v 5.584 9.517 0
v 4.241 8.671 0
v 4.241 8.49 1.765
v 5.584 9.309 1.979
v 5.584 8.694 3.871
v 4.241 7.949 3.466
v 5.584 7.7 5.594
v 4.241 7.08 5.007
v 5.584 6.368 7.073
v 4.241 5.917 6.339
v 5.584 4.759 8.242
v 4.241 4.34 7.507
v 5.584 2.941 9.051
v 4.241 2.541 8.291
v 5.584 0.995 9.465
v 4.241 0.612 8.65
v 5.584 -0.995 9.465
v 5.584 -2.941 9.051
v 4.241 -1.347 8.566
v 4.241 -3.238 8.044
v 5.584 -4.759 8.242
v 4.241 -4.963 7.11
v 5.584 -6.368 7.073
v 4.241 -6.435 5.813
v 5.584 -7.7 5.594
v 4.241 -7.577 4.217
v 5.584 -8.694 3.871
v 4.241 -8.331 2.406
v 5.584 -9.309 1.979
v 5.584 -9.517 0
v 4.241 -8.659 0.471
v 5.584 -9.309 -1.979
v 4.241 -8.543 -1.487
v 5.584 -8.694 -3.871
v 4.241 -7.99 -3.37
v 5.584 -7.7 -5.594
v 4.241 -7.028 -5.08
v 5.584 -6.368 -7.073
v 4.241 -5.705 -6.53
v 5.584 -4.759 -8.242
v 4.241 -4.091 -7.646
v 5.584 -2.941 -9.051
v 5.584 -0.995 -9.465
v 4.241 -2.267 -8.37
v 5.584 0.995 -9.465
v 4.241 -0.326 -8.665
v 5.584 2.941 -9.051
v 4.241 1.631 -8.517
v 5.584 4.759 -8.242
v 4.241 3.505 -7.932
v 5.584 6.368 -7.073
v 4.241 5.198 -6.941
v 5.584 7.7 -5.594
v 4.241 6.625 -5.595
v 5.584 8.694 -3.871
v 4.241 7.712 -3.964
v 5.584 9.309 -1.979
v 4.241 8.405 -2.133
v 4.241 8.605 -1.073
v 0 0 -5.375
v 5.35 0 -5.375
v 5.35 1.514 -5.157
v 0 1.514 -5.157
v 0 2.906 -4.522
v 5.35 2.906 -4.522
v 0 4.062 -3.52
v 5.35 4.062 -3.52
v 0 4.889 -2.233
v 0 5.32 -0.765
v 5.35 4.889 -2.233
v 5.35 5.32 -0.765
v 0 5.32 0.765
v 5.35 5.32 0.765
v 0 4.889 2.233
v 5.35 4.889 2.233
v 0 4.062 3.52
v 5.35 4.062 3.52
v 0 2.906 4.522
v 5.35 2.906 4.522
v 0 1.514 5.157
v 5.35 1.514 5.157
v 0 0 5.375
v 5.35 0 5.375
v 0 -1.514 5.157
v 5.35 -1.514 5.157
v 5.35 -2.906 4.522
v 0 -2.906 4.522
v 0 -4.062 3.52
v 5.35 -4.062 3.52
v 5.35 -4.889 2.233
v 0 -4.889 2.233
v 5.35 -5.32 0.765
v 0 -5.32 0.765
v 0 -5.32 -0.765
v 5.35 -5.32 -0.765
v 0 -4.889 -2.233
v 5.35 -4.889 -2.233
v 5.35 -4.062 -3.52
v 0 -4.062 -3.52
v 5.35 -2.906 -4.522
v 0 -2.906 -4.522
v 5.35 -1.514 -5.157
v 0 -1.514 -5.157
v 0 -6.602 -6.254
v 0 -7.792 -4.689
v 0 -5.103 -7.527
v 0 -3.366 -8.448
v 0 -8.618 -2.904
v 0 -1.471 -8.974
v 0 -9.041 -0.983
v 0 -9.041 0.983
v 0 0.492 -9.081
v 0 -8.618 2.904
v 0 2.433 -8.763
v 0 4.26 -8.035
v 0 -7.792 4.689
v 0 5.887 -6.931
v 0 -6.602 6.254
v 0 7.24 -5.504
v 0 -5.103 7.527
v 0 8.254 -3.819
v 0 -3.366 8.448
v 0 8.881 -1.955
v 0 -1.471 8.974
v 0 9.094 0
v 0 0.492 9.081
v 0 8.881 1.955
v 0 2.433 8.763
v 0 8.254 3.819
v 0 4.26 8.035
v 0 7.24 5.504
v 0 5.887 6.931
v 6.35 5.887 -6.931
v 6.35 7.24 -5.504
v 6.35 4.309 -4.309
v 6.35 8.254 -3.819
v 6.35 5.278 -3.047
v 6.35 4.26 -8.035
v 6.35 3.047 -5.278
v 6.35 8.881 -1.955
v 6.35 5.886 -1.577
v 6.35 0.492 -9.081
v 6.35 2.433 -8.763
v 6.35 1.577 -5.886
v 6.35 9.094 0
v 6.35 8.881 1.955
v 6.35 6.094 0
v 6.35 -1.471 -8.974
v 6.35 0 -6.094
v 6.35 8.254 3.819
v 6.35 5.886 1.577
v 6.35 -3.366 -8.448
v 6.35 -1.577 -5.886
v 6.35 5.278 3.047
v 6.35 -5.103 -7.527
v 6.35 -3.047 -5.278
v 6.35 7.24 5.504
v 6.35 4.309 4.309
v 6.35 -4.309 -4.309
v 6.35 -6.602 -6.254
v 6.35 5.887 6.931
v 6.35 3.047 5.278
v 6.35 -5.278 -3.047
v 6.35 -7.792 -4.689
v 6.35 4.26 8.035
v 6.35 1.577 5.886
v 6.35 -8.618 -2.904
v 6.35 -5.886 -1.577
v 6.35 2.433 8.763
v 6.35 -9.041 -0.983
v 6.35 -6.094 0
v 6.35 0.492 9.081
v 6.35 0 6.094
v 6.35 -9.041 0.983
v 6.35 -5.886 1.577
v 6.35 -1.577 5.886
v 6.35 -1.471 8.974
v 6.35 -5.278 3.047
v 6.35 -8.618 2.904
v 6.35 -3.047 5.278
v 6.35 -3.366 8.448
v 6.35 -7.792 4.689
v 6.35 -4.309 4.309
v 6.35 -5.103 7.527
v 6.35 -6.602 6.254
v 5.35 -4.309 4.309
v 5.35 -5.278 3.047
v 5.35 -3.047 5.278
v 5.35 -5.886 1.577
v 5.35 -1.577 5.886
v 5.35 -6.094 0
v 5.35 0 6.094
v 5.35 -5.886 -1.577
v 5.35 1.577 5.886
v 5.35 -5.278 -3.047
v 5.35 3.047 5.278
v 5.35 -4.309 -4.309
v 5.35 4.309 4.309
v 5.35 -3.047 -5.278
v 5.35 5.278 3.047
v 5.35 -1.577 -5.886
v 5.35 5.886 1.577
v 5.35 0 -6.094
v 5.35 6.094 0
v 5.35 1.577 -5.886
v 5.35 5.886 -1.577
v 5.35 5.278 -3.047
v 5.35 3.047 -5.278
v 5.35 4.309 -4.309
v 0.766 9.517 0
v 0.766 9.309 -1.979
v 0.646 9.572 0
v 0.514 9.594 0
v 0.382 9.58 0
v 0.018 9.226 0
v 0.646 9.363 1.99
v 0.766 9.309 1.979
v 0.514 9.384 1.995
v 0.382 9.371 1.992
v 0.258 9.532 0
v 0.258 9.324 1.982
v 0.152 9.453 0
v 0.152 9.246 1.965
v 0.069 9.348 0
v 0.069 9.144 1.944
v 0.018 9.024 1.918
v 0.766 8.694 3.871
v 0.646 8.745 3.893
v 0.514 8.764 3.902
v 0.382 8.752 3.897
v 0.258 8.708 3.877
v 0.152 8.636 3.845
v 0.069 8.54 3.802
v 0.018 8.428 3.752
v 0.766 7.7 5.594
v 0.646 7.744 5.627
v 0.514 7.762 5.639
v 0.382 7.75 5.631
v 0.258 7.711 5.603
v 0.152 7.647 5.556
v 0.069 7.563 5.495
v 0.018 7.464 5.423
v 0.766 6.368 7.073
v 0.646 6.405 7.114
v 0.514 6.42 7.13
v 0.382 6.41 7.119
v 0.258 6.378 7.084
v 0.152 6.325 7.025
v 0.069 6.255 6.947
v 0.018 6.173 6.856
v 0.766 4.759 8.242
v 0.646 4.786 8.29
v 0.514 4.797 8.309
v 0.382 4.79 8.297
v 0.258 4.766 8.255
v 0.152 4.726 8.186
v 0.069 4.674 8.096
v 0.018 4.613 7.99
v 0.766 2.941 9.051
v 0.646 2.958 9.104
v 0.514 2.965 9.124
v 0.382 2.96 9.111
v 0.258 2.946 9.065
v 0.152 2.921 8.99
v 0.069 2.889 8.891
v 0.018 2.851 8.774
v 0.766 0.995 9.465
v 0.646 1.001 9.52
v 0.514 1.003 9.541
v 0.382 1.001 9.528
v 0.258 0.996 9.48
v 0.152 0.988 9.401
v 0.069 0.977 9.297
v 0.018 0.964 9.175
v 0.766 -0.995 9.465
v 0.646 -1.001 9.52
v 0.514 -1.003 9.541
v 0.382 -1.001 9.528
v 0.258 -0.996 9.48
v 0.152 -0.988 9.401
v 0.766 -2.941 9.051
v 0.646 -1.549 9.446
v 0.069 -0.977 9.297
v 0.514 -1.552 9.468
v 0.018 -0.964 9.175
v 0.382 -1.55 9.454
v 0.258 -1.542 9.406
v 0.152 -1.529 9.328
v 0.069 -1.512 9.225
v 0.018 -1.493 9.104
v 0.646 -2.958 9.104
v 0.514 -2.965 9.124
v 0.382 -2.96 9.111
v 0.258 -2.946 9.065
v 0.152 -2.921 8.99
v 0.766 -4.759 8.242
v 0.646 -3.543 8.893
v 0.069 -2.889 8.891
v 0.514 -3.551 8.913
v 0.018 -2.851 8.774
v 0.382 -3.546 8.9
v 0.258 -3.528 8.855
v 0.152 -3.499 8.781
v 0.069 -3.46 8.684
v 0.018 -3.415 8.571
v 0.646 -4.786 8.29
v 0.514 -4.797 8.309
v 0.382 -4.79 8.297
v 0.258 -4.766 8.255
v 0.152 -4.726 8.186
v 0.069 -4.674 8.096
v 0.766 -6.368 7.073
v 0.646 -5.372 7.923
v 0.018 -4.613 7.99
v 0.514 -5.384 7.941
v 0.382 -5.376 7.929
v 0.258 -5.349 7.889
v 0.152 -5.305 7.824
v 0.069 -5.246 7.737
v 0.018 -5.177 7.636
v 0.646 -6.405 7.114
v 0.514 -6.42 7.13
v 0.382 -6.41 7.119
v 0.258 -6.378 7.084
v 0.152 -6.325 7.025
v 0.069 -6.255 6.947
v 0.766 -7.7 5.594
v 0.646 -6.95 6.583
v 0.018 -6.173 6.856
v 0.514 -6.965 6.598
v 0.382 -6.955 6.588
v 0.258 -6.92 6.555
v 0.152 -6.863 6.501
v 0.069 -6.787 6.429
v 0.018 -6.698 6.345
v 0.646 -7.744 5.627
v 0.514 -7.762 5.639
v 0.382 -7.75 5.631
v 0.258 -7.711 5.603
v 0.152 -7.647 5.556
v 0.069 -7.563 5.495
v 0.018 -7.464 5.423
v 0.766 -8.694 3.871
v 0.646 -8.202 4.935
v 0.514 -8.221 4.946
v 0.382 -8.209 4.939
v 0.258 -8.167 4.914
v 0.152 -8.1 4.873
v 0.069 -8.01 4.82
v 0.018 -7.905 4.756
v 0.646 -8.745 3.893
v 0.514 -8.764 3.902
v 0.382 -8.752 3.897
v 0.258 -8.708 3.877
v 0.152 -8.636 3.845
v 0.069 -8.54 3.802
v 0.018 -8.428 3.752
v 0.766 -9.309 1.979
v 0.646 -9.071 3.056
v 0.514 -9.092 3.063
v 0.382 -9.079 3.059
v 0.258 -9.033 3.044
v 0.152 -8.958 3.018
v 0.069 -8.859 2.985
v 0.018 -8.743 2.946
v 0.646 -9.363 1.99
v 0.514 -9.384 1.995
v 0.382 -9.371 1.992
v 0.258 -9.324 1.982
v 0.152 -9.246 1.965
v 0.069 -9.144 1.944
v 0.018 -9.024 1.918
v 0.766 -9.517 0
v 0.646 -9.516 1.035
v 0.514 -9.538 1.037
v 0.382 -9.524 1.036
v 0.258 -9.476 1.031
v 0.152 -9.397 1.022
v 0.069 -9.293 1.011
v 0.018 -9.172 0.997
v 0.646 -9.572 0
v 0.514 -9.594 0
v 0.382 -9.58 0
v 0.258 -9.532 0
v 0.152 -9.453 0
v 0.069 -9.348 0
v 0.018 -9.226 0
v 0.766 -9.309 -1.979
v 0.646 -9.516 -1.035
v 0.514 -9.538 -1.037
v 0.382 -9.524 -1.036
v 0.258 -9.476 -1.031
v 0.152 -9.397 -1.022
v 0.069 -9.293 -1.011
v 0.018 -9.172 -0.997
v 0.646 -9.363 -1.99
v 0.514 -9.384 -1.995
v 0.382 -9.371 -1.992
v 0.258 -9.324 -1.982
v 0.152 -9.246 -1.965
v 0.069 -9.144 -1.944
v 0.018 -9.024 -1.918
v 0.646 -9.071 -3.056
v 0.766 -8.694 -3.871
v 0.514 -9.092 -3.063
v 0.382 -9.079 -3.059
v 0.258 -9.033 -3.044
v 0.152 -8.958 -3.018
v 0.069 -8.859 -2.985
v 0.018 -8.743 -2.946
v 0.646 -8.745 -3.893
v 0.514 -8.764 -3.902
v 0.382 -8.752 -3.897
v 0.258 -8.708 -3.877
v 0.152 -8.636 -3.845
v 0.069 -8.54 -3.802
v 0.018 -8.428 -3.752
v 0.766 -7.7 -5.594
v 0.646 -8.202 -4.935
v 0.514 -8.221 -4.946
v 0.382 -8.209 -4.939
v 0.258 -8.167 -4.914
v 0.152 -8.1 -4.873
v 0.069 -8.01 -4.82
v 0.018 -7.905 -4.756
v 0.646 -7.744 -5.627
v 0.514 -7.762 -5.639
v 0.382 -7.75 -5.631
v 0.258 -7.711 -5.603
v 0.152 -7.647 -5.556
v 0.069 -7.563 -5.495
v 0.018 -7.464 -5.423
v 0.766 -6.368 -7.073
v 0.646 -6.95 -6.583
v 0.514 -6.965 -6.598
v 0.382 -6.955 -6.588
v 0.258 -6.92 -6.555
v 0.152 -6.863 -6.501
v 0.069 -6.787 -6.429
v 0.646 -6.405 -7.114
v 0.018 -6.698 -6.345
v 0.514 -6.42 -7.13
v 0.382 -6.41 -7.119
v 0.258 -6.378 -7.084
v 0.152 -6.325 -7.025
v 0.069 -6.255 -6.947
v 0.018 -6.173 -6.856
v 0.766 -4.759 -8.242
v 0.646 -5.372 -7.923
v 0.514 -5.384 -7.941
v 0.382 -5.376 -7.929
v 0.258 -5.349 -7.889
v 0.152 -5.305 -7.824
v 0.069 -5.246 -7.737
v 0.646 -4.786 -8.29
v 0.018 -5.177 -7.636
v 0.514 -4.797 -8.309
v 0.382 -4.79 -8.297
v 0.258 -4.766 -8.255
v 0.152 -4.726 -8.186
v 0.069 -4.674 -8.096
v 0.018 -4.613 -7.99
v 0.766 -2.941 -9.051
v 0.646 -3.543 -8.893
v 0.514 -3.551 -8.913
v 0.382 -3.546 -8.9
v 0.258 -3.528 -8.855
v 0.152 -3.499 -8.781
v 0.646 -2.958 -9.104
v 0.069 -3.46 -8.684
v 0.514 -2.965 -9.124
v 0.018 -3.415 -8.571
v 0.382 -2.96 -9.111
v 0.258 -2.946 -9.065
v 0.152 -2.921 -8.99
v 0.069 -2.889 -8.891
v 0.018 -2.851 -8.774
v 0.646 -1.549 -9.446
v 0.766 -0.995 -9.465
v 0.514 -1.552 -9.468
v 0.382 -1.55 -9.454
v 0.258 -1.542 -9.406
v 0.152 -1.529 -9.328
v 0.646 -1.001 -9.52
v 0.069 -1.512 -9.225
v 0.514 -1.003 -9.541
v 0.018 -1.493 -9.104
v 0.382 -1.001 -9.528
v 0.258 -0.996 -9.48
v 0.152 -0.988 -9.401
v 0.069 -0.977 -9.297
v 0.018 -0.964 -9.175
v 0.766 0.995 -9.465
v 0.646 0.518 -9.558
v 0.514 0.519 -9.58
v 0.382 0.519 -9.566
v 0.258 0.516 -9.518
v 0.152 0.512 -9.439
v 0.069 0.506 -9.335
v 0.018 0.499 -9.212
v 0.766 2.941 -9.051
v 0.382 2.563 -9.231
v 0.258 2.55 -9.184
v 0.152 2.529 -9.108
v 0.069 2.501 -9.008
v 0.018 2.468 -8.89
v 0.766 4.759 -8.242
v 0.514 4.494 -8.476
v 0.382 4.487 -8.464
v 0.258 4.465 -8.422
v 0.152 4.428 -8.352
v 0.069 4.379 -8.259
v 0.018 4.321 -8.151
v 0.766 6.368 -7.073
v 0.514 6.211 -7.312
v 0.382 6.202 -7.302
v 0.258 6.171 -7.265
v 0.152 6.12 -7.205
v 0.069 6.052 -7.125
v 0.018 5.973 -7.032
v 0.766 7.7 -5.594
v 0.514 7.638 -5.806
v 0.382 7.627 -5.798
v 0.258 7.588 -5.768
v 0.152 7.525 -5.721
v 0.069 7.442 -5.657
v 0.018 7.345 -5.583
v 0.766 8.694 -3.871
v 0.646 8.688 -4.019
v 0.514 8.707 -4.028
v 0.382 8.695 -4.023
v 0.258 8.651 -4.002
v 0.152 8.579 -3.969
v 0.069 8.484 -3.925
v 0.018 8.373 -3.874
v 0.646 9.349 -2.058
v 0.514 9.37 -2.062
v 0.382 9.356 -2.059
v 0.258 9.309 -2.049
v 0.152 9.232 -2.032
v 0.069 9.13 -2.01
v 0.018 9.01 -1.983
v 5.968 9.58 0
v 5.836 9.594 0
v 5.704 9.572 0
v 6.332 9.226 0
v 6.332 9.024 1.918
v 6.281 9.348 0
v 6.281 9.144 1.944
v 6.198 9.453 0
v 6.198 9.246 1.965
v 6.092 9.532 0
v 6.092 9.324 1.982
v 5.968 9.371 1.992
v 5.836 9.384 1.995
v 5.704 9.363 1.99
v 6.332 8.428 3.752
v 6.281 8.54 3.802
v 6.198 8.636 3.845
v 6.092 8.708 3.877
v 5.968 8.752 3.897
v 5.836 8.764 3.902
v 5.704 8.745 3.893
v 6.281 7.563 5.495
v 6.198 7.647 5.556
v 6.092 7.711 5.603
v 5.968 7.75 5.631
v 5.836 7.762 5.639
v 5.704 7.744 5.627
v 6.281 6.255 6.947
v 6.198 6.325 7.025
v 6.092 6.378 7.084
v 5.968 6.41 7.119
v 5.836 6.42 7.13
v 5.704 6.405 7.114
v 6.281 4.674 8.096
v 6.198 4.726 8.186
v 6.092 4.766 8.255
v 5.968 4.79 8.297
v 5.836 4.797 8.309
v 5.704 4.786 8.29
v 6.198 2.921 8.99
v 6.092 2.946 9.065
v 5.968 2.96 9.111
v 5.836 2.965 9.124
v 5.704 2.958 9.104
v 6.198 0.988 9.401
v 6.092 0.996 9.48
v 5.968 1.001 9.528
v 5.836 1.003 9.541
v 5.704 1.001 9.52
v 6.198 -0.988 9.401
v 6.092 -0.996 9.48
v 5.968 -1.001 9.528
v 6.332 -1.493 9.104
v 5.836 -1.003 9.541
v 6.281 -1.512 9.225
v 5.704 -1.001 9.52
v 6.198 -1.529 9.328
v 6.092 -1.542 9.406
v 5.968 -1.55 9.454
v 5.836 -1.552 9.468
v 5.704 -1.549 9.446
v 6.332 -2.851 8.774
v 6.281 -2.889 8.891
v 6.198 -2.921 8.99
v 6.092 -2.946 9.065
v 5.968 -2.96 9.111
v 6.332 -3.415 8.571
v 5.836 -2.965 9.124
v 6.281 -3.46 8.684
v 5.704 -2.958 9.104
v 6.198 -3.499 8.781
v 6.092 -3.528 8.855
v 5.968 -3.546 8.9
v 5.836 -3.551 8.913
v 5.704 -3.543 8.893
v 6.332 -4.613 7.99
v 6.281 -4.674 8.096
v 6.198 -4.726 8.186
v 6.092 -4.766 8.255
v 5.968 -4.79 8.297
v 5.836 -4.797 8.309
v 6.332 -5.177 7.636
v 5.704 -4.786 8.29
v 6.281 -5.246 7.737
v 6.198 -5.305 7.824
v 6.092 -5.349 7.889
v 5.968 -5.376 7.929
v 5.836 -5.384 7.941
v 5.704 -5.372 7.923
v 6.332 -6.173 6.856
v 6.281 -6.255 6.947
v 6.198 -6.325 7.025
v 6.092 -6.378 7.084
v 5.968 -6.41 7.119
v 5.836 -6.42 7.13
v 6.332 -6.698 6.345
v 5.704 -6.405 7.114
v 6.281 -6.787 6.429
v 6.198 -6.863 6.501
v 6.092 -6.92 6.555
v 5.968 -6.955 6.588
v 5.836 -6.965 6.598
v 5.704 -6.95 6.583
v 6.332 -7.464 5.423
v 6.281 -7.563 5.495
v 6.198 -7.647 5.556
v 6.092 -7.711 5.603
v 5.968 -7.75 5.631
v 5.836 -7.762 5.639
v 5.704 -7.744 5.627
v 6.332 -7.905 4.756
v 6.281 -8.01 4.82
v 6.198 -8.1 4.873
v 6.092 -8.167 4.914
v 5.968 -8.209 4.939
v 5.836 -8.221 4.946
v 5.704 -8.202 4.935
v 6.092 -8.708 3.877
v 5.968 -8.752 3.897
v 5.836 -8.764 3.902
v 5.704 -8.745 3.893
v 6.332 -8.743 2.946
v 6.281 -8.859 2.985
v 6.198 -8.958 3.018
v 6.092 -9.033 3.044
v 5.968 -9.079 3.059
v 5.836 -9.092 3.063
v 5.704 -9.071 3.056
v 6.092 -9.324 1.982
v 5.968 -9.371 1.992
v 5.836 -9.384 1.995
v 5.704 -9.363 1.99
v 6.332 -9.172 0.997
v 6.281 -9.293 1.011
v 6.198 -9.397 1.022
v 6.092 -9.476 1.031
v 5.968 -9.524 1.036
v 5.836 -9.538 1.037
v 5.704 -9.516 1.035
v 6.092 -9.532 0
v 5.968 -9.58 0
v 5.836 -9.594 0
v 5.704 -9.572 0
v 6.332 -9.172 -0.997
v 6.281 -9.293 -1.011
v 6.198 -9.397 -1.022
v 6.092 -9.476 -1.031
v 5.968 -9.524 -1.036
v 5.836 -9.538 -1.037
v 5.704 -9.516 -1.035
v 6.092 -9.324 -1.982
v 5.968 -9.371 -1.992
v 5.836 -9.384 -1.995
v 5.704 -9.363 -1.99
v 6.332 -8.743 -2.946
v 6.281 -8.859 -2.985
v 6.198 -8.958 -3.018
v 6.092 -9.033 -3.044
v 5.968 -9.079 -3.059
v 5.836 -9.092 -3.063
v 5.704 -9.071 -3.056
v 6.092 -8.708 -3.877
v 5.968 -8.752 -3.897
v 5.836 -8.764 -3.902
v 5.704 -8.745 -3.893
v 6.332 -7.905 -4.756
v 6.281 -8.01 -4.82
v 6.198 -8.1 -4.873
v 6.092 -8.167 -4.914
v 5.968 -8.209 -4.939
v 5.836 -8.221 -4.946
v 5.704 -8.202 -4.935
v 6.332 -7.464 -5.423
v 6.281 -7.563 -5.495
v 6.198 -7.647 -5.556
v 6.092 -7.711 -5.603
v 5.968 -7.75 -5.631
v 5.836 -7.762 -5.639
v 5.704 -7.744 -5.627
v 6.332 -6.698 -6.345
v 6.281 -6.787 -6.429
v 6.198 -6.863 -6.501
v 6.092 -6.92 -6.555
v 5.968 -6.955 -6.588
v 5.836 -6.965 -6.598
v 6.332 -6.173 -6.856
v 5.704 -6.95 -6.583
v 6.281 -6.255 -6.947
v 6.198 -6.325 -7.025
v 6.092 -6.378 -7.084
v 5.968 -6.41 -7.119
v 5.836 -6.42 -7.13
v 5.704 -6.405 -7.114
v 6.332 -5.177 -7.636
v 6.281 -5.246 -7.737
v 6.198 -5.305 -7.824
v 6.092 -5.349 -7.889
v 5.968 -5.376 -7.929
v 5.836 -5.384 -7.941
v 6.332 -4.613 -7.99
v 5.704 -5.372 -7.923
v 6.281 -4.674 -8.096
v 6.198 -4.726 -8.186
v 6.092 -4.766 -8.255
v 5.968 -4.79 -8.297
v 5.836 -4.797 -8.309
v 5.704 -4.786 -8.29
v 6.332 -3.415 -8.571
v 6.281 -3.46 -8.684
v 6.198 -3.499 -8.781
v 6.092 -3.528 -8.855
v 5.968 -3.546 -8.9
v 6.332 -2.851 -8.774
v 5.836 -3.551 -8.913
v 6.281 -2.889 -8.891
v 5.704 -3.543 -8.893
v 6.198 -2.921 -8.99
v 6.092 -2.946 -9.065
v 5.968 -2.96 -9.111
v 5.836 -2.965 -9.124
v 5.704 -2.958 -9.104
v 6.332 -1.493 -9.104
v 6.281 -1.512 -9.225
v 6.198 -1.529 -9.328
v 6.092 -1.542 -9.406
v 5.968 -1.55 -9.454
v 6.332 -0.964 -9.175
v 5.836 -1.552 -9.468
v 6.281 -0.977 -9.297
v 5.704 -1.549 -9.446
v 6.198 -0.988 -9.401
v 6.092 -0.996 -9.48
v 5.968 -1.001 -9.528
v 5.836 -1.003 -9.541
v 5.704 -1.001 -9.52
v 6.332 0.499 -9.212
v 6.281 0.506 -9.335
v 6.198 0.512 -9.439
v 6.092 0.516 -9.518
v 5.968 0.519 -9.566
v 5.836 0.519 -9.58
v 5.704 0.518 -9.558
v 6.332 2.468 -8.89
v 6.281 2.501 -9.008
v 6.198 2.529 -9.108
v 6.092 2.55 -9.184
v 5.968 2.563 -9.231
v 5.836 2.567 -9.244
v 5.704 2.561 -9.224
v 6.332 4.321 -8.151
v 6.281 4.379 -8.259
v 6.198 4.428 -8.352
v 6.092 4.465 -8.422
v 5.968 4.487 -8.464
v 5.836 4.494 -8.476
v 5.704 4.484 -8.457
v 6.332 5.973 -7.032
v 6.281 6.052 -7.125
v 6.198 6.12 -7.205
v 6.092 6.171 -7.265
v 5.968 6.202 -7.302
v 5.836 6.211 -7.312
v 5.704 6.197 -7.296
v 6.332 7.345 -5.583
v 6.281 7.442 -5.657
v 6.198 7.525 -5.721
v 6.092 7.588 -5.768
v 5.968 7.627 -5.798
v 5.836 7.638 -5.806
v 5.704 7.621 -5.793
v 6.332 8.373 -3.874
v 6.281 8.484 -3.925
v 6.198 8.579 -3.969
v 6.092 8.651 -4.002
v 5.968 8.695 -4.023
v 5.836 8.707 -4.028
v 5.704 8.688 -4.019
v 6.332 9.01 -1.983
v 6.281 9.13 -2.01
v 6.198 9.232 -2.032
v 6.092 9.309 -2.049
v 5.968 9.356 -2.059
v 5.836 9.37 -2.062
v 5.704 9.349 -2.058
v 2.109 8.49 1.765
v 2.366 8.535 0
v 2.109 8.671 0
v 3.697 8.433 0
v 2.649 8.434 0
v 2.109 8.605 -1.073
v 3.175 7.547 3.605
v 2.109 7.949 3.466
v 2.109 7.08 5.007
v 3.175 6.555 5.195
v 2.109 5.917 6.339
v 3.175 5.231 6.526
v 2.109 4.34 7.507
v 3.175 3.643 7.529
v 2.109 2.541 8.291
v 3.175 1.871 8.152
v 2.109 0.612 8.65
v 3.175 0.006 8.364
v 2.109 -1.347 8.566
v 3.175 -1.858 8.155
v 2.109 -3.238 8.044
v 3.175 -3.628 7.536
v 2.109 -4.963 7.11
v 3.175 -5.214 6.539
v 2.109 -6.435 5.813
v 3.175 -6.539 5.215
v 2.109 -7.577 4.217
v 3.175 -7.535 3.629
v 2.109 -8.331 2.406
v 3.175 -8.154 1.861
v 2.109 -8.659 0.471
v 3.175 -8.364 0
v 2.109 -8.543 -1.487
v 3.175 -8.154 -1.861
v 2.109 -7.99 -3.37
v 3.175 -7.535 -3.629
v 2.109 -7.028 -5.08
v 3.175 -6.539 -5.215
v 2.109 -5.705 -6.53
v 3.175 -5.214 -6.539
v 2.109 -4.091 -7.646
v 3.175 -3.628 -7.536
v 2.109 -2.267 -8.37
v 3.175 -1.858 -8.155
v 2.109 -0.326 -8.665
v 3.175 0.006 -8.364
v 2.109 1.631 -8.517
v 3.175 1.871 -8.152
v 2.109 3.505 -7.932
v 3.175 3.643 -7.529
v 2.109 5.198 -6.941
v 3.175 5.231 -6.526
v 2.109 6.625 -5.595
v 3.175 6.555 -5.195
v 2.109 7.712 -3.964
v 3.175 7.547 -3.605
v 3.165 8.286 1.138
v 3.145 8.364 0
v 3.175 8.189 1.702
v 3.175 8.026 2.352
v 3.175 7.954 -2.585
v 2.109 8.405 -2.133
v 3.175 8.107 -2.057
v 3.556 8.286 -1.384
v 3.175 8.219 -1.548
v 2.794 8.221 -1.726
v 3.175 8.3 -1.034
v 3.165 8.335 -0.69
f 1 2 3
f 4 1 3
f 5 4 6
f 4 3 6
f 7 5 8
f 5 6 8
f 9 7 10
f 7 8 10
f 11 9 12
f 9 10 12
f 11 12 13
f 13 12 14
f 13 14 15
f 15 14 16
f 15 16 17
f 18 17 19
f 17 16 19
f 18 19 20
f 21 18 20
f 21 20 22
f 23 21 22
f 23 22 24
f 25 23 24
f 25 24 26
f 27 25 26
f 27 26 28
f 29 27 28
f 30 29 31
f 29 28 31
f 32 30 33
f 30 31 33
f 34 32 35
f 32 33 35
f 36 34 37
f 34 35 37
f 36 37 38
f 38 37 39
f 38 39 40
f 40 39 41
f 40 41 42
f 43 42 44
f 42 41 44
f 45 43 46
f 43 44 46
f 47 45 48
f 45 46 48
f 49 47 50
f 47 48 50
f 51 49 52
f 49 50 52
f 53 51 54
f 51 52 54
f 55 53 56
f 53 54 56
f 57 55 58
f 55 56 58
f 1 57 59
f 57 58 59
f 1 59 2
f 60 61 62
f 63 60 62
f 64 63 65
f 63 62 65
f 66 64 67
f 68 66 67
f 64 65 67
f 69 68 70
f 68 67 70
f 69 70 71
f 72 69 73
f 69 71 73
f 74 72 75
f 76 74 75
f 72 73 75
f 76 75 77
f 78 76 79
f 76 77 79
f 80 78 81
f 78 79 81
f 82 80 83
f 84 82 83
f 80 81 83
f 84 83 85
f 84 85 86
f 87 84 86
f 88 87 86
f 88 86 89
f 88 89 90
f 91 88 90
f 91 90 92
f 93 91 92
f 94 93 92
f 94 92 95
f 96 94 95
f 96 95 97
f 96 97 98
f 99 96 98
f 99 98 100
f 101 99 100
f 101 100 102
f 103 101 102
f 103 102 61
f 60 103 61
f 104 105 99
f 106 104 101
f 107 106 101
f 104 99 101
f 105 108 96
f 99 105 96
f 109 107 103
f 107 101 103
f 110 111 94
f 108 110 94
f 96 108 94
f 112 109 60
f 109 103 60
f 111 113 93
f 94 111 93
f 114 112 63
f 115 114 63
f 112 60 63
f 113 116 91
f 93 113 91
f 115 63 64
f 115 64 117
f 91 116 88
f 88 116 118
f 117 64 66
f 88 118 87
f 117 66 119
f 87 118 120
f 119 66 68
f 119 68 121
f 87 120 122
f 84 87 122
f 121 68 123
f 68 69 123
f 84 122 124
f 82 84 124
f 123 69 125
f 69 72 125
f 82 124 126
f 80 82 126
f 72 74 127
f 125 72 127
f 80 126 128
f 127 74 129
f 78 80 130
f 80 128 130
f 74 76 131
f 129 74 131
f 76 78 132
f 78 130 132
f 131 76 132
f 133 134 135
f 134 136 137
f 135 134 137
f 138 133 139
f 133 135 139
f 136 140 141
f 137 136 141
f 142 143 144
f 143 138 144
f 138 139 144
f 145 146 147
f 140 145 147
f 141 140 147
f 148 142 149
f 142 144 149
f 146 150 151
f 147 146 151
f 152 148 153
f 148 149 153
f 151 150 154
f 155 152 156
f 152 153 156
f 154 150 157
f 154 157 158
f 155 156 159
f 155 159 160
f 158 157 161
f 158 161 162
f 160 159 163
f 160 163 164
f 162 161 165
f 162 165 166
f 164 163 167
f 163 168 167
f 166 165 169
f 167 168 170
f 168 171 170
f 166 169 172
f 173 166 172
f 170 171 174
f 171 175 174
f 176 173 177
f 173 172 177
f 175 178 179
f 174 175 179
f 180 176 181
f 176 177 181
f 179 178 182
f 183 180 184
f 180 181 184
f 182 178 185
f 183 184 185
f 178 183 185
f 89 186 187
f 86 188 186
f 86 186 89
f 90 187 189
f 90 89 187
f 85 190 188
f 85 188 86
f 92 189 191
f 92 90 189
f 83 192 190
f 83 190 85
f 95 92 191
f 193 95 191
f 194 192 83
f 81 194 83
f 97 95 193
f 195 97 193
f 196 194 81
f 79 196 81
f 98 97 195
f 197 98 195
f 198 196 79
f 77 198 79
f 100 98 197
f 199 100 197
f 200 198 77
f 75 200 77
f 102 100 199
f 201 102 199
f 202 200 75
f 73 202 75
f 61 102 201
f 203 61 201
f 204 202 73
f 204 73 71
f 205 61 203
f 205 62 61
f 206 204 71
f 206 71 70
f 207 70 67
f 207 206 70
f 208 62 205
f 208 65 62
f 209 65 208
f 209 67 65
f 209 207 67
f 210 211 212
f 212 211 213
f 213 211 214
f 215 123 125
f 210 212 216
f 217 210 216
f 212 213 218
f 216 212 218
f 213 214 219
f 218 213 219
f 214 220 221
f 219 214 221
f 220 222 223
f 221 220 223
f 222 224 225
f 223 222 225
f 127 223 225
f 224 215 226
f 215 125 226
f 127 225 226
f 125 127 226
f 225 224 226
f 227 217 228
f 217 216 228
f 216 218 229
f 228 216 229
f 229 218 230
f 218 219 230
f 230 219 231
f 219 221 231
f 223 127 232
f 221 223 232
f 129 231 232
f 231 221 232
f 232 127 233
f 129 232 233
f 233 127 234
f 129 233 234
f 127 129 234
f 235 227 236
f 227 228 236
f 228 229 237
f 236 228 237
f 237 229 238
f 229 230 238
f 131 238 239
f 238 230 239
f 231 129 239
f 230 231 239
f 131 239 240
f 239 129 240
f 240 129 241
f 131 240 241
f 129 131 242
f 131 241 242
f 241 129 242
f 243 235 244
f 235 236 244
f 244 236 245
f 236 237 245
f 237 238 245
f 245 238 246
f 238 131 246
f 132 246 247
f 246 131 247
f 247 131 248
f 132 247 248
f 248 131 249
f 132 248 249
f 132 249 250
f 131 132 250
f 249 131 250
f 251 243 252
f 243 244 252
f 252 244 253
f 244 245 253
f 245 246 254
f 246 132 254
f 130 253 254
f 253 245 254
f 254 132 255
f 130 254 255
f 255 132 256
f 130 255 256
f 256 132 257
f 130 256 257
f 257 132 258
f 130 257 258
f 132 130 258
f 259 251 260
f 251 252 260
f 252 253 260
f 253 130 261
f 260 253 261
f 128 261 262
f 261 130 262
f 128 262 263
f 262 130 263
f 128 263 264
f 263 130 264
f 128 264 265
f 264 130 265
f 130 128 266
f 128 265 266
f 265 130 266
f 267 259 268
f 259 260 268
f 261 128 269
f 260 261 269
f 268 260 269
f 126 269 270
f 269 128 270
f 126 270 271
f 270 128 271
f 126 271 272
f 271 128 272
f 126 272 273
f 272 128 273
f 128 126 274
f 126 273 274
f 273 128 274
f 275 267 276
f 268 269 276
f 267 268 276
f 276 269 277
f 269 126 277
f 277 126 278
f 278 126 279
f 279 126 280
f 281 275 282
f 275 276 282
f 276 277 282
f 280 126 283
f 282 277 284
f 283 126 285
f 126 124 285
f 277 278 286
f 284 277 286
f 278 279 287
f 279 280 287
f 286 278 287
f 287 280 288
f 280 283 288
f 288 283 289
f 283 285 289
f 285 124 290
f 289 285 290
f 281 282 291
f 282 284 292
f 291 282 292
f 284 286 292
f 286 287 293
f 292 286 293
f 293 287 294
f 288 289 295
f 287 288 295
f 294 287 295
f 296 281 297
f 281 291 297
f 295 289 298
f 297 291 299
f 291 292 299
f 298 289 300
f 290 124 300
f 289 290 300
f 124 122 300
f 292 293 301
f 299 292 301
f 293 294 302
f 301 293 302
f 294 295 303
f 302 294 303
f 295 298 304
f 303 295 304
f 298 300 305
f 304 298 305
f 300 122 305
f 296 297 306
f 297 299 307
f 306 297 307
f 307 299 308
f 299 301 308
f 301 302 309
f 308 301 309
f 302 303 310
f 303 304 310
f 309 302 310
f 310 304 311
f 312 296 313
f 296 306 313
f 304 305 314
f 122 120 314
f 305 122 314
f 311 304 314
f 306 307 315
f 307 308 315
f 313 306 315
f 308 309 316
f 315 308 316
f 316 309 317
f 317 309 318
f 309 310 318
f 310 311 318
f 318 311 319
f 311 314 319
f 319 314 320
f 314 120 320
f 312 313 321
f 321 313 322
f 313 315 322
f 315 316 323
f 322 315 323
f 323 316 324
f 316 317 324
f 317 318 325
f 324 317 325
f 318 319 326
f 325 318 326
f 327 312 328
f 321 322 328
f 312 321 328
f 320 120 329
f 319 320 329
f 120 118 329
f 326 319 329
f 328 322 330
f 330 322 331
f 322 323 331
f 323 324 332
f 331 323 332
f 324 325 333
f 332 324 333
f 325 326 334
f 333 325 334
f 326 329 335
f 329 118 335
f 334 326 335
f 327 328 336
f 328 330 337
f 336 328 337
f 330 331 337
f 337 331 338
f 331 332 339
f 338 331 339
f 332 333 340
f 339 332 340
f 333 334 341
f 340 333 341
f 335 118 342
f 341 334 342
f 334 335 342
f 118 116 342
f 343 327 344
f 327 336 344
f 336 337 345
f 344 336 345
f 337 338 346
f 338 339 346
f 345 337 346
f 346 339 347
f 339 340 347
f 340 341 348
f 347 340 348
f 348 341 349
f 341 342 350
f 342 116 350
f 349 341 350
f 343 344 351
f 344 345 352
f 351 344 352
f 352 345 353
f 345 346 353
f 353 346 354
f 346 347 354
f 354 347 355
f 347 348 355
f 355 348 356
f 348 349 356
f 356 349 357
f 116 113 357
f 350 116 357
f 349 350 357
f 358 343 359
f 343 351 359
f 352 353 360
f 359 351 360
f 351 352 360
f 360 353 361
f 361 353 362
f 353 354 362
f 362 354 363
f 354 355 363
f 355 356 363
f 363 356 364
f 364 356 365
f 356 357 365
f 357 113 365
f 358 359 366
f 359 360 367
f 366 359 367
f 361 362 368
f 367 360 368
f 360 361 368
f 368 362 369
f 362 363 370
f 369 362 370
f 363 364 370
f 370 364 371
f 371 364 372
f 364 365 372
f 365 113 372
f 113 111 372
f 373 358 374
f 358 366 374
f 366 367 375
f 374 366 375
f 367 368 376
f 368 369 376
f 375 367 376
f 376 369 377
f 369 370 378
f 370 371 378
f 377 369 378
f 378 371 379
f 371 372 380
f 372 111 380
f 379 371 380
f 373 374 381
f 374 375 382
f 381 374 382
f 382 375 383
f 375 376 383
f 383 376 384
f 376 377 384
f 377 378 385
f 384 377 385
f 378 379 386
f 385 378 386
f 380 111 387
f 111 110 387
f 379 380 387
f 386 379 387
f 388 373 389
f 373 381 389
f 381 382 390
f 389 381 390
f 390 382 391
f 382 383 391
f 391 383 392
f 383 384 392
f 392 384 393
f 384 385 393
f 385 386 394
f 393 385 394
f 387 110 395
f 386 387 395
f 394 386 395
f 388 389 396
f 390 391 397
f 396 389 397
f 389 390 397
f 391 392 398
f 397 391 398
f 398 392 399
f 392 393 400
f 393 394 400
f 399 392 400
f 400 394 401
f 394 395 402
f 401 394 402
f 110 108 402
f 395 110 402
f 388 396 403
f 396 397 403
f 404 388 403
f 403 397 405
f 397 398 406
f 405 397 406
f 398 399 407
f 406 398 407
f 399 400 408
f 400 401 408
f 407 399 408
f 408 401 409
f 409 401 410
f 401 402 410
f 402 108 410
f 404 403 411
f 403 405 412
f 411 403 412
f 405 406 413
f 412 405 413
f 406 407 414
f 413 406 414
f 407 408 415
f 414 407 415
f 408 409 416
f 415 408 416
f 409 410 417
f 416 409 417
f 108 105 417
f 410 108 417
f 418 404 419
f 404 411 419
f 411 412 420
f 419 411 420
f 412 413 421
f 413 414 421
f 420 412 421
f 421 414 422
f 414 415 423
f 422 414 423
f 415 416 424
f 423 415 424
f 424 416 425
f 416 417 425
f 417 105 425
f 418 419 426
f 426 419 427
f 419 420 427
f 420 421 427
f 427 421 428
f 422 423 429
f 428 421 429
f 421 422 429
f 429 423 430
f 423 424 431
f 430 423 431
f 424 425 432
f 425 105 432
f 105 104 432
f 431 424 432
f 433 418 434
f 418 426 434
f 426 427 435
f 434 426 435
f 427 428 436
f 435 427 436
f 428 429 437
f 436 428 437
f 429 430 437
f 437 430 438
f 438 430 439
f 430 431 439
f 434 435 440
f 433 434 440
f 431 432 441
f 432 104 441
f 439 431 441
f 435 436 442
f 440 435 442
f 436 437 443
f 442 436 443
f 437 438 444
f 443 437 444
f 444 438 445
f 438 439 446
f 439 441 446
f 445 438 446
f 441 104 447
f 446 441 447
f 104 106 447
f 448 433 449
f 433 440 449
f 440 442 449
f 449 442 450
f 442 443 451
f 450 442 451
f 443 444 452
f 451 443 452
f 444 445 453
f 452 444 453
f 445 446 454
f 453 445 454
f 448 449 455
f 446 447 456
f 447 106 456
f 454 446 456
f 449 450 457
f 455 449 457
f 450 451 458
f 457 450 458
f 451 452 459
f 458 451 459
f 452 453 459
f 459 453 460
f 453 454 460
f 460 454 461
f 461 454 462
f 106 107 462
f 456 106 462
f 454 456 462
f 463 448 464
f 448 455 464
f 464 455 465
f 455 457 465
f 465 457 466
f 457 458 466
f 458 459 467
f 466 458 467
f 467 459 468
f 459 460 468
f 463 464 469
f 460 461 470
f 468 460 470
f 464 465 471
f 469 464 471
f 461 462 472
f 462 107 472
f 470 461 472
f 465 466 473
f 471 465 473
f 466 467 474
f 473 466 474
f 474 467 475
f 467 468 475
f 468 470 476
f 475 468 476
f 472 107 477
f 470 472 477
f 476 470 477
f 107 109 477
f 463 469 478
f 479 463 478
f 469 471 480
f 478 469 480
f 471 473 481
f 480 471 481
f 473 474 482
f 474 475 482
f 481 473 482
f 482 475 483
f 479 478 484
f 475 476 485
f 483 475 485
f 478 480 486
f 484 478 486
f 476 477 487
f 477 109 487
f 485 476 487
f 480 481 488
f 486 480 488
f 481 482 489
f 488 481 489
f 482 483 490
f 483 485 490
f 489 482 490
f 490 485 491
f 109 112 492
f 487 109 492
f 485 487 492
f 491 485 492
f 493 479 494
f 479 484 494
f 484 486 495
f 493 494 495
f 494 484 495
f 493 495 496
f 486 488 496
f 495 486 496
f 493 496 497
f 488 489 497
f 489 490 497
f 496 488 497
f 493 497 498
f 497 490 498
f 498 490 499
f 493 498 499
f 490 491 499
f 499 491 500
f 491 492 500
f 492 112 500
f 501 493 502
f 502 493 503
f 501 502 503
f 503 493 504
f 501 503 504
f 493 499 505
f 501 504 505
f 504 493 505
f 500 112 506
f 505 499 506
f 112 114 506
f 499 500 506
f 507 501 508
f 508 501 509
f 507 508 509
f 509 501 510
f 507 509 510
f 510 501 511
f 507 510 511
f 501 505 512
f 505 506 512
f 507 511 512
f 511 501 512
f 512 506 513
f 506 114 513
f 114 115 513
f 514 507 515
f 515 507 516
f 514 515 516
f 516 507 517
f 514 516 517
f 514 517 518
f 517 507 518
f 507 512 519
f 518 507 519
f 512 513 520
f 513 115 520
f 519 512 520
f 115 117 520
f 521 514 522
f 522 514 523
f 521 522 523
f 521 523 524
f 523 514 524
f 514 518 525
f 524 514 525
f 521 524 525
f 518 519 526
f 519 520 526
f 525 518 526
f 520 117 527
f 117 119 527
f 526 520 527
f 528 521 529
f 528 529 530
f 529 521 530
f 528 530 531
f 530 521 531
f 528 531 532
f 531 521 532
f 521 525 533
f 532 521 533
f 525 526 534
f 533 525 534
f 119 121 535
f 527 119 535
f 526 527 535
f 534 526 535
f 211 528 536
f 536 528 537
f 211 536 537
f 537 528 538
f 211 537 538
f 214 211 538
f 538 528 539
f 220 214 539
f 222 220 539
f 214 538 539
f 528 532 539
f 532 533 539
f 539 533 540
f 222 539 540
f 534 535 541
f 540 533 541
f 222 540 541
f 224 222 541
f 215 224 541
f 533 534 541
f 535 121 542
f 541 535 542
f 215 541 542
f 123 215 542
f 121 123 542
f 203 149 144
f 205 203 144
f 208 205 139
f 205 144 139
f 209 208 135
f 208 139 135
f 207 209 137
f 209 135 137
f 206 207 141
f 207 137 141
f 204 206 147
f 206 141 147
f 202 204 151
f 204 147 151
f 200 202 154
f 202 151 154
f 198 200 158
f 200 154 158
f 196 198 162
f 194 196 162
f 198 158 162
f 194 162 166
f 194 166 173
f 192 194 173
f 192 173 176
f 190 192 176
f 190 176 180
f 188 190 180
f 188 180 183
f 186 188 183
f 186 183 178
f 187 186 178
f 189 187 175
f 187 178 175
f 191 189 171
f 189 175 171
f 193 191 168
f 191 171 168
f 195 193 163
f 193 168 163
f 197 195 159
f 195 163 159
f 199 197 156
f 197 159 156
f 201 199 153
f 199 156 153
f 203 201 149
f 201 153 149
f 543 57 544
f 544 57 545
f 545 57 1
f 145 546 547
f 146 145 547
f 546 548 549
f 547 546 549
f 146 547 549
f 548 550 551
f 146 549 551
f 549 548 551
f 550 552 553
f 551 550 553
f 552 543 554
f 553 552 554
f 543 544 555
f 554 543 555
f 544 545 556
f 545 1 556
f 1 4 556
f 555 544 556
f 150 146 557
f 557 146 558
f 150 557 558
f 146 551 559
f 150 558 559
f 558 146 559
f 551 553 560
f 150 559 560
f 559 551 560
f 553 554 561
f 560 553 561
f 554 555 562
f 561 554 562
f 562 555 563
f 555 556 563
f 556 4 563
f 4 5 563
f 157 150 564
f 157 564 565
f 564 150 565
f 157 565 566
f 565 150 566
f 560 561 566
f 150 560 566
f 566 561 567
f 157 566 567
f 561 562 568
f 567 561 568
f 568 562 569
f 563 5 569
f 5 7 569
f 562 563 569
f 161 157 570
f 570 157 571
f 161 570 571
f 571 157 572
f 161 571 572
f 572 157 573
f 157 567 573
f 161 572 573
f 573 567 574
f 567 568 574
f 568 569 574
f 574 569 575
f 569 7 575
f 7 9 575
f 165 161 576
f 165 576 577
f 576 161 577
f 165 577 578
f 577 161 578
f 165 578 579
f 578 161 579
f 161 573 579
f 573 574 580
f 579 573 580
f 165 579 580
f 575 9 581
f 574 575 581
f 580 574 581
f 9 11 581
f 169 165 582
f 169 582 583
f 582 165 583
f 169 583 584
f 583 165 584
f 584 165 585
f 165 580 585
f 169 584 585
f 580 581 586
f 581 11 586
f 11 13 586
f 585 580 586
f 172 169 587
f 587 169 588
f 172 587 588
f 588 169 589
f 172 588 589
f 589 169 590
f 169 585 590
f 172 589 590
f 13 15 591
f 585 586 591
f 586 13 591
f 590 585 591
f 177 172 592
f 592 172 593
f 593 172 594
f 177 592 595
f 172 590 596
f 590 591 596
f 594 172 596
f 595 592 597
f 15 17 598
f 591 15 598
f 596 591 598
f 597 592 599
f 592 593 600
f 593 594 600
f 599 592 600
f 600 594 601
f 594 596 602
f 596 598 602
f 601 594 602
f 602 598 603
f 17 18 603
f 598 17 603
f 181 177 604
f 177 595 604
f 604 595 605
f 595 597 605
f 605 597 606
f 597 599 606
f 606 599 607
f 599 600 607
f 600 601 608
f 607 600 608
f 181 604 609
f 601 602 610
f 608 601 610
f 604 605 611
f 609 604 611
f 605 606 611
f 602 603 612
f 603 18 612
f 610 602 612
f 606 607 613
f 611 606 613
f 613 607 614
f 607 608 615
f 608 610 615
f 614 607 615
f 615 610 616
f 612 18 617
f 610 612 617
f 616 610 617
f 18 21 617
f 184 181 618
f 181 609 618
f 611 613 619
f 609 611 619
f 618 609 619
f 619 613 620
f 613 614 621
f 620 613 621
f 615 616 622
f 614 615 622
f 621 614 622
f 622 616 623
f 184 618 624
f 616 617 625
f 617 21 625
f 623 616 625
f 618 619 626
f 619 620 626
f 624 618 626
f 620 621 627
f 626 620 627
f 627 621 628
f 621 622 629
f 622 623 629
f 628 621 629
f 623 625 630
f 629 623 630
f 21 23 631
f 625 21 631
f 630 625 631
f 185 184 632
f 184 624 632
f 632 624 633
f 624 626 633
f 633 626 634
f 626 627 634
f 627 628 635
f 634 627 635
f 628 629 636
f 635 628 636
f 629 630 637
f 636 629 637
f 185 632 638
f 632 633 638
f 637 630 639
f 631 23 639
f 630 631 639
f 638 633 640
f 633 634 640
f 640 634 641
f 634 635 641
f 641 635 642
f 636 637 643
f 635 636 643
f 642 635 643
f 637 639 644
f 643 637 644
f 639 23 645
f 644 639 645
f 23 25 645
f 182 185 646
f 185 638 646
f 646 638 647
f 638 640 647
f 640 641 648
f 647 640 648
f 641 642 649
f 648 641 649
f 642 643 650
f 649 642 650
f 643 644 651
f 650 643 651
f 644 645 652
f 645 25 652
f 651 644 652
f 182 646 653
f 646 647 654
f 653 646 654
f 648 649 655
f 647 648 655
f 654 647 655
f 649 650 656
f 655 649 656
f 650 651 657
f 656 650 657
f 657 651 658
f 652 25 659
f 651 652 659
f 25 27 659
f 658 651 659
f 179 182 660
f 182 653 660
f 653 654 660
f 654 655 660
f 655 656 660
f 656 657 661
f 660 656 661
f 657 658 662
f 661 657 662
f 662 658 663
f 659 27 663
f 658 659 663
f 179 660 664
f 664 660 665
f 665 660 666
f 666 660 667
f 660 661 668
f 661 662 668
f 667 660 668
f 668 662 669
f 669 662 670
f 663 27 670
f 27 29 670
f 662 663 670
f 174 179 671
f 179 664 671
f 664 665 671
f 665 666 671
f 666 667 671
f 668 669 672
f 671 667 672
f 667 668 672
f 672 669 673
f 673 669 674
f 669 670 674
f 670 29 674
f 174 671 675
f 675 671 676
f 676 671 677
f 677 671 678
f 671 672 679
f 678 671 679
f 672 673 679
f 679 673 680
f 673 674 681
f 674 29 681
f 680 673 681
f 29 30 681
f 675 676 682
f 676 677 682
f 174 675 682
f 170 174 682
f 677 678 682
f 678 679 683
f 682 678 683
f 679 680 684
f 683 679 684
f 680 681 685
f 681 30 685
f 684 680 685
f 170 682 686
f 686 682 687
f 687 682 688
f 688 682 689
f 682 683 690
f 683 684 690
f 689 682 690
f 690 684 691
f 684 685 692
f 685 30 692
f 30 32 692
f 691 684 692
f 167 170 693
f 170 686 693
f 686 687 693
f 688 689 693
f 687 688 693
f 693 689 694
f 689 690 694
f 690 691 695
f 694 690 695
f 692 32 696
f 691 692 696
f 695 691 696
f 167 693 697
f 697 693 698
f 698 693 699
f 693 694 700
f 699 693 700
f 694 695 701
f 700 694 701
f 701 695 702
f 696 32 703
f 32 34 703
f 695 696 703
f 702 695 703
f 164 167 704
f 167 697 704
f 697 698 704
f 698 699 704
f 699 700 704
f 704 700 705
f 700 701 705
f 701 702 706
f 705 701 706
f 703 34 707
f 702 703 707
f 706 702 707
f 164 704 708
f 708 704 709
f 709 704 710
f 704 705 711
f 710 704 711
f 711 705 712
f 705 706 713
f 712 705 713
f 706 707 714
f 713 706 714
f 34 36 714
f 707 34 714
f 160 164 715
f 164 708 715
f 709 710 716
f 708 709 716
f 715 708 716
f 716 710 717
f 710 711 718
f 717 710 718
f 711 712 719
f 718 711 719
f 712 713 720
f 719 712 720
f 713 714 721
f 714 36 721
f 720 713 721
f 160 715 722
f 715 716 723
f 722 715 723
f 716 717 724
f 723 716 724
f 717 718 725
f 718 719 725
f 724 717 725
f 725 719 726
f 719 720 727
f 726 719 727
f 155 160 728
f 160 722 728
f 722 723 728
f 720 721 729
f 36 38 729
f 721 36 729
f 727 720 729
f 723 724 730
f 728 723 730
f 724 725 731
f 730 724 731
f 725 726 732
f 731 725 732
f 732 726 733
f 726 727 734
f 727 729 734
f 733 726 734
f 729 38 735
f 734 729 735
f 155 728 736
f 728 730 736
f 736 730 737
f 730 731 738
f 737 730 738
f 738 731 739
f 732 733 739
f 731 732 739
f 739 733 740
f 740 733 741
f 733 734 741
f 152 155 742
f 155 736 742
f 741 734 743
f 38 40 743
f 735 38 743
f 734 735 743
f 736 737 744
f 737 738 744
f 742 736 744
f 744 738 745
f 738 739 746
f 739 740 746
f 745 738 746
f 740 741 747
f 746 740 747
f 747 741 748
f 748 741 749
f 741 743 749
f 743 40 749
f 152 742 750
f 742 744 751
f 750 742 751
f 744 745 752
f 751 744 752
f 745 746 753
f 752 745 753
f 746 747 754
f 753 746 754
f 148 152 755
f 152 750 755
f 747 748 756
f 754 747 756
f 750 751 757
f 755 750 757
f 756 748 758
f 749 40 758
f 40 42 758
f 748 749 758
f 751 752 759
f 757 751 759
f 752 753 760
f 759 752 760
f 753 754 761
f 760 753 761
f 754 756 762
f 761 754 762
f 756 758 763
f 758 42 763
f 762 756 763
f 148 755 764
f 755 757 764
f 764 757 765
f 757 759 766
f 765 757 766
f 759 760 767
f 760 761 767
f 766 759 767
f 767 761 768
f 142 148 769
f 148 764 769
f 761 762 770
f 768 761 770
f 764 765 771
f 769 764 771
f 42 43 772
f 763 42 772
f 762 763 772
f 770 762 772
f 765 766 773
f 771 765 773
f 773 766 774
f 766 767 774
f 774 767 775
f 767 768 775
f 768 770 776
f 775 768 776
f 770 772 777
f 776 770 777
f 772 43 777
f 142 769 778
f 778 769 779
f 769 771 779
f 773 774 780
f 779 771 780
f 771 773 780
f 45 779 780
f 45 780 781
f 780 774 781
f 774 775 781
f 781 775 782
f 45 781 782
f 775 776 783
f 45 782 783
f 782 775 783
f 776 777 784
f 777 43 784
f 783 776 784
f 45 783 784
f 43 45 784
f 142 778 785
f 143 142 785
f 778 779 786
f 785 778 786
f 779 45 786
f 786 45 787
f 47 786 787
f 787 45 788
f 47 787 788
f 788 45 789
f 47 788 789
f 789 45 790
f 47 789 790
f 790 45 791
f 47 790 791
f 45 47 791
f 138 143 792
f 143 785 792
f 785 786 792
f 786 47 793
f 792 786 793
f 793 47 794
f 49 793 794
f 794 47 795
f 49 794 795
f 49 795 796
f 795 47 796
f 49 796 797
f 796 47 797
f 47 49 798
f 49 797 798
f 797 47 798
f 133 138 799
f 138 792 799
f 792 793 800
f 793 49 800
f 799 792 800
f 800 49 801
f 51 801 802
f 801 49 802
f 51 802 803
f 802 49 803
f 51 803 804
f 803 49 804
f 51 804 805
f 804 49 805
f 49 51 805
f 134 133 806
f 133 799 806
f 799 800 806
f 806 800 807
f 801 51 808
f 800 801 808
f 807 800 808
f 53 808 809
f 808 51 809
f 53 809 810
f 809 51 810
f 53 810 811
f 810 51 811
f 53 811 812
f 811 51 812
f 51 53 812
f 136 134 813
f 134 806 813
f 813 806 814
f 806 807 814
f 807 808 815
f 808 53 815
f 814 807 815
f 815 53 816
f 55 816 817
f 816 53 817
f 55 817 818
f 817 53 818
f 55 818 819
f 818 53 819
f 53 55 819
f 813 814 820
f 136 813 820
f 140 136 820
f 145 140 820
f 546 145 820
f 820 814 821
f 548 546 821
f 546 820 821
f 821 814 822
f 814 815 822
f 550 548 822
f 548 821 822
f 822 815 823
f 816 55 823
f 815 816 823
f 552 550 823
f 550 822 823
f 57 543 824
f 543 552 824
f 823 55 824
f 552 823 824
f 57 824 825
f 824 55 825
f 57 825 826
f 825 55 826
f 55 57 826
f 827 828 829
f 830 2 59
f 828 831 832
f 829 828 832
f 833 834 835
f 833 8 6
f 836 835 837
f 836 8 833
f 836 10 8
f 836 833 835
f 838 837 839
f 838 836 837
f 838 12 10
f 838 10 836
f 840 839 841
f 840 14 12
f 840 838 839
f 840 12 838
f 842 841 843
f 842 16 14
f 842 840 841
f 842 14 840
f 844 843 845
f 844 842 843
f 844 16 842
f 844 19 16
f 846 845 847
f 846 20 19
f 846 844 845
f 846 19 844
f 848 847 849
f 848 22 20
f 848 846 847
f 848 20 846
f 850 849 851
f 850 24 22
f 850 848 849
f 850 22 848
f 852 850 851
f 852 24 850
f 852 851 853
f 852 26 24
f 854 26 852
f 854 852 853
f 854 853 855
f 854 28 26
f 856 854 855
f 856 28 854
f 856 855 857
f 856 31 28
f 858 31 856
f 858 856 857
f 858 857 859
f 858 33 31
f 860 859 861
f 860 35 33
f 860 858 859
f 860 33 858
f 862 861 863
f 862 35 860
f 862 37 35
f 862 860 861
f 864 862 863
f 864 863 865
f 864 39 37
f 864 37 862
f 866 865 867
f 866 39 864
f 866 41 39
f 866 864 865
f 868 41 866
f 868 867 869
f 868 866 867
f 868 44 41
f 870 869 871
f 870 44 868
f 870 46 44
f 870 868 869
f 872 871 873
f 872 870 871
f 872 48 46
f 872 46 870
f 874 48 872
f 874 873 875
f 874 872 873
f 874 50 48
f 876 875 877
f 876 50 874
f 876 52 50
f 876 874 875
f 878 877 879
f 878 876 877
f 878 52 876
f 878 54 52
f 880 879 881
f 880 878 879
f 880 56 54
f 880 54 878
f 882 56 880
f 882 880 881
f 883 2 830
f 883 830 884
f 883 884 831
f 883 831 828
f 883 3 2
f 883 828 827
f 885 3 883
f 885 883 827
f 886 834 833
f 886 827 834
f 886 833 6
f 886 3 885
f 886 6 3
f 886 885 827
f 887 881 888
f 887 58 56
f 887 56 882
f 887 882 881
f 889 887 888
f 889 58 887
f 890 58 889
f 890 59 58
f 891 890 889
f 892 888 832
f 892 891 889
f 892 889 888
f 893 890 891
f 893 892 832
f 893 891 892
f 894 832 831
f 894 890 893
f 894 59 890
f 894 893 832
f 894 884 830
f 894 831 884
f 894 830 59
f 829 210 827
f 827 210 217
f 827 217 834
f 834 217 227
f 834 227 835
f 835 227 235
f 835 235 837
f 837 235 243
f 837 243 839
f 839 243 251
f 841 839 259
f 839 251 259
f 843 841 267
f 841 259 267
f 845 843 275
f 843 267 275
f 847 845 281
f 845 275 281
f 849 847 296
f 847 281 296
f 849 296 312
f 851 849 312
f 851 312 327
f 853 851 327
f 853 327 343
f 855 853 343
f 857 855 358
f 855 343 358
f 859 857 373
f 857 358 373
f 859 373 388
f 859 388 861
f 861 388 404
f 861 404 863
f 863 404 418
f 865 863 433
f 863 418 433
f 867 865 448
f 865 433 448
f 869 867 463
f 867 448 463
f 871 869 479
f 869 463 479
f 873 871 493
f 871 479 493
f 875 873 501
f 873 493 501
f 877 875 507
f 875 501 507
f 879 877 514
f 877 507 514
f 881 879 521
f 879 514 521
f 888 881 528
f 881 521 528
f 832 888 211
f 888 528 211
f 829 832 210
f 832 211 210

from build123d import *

# Parameters (mm, degrees)
FILLET1_R          = 0.5
FILLET2_R          = 2
SKETCH2_R          = 6.094107734
CUT_EXTRUDE1_DEPTH = 1
SKETCH3_R          = 5.375
CUT_EXTRUDE2_DEPTH = 6.35


with BuildPart() as part:
    # Sketch1 → Revolve1 (revolve)
    with BuildSketch(Plane.XY):
        Polygon((0, 0), (6.35, 0), (6.35, 10), (3.175, 8), (0, 10), align=None)
    revolve(axis=Axis((0, 0, 0), (1, 0, 0)))

    # Fillet1
    fillet1_edges = [part.edges().sort_by_distance(p)[0] for p in [
        (0, -10, 0),
        (6.35, -10, 0),
    ]]
    fillet(fillet1_edges, radius=FILLET1_R)

    # Fillet2
    fillet2_edges = [part.edges().sort_by_distance(p)[0] for p in [
        (3.175, -8, 0),
    ]]
    fillet(fillet2_edges, radius=FILLET2_R)

    # Sketch2 → Cut-Extrude1 (cut)
    with BuildSketch(Plane(origin=(6.35, 0, 0), x_dir=(0, 0, -1), z_dir=(1, 0, 0))):
        Circle(SKETCH2_R)
    extrude(amount=-CUT_EXTRUDE1_DEPTH, mode=Mode.SUBTRACT)

    # Sketch3 → Cut-Extrude2 (cut, through all)
    with BuildSketch(Plane(origin=(5.35, 0, 0), x_dir=(0, 0, -1), z_dir=(1, 0, 0))):
        Circle(SKETCH3_R)
    extrude(amount=-CUT_EXTRUDE2_DEPTH, mode=Mode.SUBTRACT)


solid = part.part
